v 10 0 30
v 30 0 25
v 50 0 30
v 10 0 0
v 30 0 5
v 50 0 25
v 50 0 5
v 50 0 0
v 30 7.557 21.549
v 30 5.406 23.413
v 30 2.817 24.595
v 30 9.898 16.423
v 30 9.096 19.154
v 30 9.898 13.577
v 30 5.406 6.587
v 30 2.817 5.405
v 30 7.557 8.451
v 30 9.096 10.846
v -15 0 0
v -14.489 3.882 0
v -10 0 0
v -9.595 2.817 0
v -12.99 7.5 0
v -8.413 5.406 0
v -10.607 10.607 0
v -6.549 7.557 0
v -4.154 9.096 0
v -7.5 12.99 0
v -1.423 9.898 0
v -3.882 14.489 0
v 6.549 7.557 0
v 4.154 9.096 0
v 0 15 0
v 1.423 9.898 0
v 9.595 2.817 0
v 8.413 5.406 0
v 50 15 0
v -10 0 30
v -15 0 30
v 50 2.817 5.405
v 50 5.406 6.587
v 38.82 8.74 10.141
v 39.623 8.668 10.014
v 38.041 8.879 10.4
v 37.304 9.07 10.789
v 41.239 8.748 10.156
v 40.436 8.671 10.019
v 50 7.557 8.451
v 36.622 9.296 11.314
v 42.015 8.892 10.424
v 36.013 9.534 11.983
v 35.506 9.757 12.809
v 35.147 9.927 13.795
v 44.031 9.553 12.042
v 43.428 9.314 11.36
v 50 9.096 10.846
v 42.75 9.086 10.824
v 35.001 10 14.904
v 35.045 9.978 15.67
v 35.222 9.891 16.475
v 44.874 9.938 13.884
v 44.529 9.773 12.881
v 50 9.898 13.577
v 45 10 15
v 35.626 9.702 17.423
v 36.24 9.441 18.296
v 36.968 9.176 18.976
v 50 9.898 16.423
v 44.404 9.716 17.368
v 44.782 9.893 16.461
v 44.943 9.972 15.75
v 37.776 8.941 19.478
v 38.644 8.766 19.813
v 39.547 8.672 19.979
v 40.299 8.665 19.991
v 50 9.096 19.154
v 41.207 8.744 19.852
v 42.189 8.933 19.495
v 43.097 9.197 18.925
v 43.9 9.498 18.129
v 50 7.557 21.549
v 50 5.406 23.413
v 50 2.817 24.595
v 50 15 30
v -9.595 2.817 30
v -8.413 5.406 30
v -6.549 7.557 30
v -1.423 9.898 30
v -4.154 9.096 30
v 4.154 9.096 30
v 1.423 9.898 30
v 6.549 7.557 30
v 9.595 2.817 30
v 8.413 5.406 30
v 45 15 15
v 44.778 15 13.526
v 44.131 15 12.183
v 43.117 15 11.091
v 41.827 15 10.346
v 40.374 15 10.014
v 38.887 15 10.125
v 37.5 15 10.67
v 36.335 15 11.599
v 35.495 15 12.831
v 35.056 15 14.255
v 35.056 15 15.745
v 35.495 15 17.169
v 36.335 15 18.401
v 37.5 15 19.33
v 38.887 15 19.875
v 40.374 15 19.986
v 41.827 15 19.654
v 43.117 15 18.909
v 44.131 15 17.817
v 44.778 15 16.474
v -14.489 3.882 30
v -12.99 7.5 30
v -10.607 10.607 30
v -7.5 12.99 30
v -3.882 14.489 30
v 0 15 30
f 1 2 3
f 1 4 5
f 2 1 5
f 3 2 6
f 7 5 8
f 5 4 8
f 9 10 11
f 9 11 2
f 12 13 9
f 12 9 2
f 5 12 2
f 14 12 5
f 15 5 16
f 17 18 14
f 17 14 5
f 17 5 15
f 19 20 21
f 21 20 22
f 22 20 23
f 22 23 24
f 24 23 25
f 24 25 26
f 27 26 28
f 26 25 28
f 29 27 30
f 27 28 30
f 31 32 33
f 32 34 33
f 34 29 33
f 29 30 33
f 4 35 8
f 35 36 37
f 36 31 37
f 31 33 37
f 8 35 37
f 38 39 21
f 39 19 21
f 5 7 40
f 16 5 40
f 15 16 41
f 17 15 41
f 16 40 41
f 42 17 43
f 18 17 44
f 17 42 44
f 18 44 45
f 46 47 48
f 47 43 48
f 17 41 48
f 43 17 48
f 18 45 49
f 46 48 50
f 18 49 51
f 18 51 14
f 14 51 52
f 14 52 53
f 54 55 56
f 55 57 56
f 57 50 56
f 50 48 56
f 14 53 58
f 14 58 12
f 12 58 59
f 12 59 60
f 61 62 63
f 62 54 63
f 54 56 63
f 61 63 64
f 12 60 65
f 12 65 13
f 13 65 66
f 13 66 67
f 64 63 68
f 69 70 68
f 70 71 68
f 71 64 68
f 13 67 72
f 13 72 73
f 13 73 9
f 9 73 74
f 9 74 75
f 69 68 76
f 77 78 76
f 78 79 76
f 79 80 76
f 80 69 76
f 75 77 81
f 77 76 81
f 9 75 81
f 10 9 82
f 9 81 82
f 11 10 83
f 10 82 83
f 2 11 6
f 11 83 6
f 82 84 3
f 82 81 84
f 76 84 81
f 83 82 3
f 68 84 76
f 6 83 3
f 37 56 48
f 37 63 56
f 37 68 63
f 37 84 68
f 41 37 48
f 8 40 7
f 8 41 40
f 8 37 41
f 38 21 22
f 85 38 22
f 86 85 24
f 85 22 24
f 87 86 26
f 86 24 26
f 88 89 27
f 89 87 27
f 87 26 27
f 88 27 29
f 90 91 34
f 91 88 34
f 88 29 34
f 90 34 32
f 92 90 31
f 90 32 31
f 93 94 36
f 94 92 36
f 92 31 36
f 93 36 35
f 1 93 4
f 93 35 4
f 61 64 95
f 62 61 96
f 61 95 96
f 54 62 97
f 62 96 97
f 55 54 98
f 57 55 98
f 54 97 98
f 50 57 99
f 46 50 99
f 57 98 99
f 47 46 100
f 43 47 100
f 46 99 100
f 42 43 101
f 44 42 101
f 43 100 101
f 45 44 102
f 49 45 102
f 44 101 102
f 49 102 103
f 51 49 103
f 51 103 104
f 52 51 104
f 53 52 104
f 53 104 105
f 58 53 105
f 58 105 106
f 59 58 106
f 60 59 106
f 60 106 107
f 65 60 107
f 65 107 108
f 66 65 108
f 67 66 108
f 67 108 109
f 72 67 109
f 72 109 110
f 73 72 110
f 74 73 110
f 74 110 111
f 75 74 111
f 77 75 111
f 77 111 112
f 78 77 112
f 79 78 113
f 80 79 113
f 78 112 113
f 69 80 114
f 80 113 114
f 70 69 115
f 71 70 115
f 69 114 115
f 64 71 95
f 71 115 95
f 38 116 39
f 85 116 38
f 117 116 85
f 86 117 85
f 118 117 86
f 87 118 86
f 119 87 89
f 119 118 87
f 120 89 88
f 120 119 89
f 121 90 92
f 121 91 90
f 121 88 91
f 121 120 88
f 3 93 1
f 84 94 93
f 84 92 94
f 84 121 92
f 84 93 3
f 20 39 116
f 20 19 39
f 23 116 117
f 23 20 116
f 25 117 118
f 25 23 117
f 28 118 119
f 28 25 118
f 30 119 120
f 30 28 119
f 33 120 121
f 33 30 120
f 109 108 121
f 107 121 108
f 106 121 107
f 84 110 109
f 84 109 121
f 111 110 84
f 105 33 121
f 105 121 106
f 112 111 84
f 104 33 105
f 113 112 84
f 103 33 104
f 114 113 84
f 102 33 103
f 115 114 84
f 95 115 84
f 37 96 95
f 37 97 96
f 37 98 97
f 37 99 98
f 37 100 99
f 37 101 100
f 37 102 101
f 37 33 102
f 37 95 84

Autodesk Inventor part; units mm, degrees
ref_plane "YZ Plane" through (0, 0, 0) normal (1, 0, 0) x (0, 1, 0)
ref_plane "XZ Plane" through (0, 0, 0) normal (0, 1, 0) x (-1, 0, 0)
ref_plane "XY Plane" through (0, 0, 0) normal (0, 0, 1) x (1, 0, 0)
sketch "Sketch1" plane through (0, 0, 0) normal (0, 0, 1) x (1, 0, 0)
  circle A0 centre (0, 0) radius 10
  circle A1 centre (0, 0) radius 15
  line L0 (0, 15) -> (50, 15)
  line L1 (50, 15) -> (50, -15)
  line L2 (0, -15) -> (50, -15)
  line L3 (-15, 0) -> (50, 0)
  point P0 (-10, 0)
  point P1 (10, 0)
  dimension "d0" = 20
  dimension "d1" = 30
  dimension "d2" = 50
extrude "Extrusion1" add sketch "Sketch1" along normal blind 30 contours A0 L3 A1 | A1 L0 L1 L3 picked at (13.208, 1.1126)
sketch "Sketch2" plane through (50, 0, 0) normal (1, 0, 0) x (0, 0, -1)
  line L0 (0, 0) -> (-30, 0) projected
  circle A0 centre (-15, 0) radius 10
  point P0 (-25, 0)
  point P1 (-5, 0)
  dimension "d5" = 20
extrude "Extrusion2" cut sketch "Sketch2" against normal blind 20 contours L0 A0 picked at (-12.505, 2.2104)
sketch "Sketch3" plane through (0, 15, 0) normal (0, 1, 0) x (1, 0, 0)
  line L0 (50, 0) -> (0, 0) projected
  line L1 (0, 0) -> (0, -30) projected
  line L2 (50, -30) -> (0, -30) projected
  line L3 (50, 0) -> (50, -30) projected
  line L4 (50, -5) -> (50, -25) construction
  line L5 (50, -15) -> (40, -15) construction
  circle A0 centre (40, -15) radius 5
  dimension "d8" = 10
  dimension "d9" = 10
ref_plane "Work Plane1" through (0, 0, 15) normal (0, 0, 1) x (1, 0, 0)
extrude "Extrusion3" cut sketch "Sketch3" against normal blind 10 contours A0
properties part number "AbrazaderaBarraAscenso1"
